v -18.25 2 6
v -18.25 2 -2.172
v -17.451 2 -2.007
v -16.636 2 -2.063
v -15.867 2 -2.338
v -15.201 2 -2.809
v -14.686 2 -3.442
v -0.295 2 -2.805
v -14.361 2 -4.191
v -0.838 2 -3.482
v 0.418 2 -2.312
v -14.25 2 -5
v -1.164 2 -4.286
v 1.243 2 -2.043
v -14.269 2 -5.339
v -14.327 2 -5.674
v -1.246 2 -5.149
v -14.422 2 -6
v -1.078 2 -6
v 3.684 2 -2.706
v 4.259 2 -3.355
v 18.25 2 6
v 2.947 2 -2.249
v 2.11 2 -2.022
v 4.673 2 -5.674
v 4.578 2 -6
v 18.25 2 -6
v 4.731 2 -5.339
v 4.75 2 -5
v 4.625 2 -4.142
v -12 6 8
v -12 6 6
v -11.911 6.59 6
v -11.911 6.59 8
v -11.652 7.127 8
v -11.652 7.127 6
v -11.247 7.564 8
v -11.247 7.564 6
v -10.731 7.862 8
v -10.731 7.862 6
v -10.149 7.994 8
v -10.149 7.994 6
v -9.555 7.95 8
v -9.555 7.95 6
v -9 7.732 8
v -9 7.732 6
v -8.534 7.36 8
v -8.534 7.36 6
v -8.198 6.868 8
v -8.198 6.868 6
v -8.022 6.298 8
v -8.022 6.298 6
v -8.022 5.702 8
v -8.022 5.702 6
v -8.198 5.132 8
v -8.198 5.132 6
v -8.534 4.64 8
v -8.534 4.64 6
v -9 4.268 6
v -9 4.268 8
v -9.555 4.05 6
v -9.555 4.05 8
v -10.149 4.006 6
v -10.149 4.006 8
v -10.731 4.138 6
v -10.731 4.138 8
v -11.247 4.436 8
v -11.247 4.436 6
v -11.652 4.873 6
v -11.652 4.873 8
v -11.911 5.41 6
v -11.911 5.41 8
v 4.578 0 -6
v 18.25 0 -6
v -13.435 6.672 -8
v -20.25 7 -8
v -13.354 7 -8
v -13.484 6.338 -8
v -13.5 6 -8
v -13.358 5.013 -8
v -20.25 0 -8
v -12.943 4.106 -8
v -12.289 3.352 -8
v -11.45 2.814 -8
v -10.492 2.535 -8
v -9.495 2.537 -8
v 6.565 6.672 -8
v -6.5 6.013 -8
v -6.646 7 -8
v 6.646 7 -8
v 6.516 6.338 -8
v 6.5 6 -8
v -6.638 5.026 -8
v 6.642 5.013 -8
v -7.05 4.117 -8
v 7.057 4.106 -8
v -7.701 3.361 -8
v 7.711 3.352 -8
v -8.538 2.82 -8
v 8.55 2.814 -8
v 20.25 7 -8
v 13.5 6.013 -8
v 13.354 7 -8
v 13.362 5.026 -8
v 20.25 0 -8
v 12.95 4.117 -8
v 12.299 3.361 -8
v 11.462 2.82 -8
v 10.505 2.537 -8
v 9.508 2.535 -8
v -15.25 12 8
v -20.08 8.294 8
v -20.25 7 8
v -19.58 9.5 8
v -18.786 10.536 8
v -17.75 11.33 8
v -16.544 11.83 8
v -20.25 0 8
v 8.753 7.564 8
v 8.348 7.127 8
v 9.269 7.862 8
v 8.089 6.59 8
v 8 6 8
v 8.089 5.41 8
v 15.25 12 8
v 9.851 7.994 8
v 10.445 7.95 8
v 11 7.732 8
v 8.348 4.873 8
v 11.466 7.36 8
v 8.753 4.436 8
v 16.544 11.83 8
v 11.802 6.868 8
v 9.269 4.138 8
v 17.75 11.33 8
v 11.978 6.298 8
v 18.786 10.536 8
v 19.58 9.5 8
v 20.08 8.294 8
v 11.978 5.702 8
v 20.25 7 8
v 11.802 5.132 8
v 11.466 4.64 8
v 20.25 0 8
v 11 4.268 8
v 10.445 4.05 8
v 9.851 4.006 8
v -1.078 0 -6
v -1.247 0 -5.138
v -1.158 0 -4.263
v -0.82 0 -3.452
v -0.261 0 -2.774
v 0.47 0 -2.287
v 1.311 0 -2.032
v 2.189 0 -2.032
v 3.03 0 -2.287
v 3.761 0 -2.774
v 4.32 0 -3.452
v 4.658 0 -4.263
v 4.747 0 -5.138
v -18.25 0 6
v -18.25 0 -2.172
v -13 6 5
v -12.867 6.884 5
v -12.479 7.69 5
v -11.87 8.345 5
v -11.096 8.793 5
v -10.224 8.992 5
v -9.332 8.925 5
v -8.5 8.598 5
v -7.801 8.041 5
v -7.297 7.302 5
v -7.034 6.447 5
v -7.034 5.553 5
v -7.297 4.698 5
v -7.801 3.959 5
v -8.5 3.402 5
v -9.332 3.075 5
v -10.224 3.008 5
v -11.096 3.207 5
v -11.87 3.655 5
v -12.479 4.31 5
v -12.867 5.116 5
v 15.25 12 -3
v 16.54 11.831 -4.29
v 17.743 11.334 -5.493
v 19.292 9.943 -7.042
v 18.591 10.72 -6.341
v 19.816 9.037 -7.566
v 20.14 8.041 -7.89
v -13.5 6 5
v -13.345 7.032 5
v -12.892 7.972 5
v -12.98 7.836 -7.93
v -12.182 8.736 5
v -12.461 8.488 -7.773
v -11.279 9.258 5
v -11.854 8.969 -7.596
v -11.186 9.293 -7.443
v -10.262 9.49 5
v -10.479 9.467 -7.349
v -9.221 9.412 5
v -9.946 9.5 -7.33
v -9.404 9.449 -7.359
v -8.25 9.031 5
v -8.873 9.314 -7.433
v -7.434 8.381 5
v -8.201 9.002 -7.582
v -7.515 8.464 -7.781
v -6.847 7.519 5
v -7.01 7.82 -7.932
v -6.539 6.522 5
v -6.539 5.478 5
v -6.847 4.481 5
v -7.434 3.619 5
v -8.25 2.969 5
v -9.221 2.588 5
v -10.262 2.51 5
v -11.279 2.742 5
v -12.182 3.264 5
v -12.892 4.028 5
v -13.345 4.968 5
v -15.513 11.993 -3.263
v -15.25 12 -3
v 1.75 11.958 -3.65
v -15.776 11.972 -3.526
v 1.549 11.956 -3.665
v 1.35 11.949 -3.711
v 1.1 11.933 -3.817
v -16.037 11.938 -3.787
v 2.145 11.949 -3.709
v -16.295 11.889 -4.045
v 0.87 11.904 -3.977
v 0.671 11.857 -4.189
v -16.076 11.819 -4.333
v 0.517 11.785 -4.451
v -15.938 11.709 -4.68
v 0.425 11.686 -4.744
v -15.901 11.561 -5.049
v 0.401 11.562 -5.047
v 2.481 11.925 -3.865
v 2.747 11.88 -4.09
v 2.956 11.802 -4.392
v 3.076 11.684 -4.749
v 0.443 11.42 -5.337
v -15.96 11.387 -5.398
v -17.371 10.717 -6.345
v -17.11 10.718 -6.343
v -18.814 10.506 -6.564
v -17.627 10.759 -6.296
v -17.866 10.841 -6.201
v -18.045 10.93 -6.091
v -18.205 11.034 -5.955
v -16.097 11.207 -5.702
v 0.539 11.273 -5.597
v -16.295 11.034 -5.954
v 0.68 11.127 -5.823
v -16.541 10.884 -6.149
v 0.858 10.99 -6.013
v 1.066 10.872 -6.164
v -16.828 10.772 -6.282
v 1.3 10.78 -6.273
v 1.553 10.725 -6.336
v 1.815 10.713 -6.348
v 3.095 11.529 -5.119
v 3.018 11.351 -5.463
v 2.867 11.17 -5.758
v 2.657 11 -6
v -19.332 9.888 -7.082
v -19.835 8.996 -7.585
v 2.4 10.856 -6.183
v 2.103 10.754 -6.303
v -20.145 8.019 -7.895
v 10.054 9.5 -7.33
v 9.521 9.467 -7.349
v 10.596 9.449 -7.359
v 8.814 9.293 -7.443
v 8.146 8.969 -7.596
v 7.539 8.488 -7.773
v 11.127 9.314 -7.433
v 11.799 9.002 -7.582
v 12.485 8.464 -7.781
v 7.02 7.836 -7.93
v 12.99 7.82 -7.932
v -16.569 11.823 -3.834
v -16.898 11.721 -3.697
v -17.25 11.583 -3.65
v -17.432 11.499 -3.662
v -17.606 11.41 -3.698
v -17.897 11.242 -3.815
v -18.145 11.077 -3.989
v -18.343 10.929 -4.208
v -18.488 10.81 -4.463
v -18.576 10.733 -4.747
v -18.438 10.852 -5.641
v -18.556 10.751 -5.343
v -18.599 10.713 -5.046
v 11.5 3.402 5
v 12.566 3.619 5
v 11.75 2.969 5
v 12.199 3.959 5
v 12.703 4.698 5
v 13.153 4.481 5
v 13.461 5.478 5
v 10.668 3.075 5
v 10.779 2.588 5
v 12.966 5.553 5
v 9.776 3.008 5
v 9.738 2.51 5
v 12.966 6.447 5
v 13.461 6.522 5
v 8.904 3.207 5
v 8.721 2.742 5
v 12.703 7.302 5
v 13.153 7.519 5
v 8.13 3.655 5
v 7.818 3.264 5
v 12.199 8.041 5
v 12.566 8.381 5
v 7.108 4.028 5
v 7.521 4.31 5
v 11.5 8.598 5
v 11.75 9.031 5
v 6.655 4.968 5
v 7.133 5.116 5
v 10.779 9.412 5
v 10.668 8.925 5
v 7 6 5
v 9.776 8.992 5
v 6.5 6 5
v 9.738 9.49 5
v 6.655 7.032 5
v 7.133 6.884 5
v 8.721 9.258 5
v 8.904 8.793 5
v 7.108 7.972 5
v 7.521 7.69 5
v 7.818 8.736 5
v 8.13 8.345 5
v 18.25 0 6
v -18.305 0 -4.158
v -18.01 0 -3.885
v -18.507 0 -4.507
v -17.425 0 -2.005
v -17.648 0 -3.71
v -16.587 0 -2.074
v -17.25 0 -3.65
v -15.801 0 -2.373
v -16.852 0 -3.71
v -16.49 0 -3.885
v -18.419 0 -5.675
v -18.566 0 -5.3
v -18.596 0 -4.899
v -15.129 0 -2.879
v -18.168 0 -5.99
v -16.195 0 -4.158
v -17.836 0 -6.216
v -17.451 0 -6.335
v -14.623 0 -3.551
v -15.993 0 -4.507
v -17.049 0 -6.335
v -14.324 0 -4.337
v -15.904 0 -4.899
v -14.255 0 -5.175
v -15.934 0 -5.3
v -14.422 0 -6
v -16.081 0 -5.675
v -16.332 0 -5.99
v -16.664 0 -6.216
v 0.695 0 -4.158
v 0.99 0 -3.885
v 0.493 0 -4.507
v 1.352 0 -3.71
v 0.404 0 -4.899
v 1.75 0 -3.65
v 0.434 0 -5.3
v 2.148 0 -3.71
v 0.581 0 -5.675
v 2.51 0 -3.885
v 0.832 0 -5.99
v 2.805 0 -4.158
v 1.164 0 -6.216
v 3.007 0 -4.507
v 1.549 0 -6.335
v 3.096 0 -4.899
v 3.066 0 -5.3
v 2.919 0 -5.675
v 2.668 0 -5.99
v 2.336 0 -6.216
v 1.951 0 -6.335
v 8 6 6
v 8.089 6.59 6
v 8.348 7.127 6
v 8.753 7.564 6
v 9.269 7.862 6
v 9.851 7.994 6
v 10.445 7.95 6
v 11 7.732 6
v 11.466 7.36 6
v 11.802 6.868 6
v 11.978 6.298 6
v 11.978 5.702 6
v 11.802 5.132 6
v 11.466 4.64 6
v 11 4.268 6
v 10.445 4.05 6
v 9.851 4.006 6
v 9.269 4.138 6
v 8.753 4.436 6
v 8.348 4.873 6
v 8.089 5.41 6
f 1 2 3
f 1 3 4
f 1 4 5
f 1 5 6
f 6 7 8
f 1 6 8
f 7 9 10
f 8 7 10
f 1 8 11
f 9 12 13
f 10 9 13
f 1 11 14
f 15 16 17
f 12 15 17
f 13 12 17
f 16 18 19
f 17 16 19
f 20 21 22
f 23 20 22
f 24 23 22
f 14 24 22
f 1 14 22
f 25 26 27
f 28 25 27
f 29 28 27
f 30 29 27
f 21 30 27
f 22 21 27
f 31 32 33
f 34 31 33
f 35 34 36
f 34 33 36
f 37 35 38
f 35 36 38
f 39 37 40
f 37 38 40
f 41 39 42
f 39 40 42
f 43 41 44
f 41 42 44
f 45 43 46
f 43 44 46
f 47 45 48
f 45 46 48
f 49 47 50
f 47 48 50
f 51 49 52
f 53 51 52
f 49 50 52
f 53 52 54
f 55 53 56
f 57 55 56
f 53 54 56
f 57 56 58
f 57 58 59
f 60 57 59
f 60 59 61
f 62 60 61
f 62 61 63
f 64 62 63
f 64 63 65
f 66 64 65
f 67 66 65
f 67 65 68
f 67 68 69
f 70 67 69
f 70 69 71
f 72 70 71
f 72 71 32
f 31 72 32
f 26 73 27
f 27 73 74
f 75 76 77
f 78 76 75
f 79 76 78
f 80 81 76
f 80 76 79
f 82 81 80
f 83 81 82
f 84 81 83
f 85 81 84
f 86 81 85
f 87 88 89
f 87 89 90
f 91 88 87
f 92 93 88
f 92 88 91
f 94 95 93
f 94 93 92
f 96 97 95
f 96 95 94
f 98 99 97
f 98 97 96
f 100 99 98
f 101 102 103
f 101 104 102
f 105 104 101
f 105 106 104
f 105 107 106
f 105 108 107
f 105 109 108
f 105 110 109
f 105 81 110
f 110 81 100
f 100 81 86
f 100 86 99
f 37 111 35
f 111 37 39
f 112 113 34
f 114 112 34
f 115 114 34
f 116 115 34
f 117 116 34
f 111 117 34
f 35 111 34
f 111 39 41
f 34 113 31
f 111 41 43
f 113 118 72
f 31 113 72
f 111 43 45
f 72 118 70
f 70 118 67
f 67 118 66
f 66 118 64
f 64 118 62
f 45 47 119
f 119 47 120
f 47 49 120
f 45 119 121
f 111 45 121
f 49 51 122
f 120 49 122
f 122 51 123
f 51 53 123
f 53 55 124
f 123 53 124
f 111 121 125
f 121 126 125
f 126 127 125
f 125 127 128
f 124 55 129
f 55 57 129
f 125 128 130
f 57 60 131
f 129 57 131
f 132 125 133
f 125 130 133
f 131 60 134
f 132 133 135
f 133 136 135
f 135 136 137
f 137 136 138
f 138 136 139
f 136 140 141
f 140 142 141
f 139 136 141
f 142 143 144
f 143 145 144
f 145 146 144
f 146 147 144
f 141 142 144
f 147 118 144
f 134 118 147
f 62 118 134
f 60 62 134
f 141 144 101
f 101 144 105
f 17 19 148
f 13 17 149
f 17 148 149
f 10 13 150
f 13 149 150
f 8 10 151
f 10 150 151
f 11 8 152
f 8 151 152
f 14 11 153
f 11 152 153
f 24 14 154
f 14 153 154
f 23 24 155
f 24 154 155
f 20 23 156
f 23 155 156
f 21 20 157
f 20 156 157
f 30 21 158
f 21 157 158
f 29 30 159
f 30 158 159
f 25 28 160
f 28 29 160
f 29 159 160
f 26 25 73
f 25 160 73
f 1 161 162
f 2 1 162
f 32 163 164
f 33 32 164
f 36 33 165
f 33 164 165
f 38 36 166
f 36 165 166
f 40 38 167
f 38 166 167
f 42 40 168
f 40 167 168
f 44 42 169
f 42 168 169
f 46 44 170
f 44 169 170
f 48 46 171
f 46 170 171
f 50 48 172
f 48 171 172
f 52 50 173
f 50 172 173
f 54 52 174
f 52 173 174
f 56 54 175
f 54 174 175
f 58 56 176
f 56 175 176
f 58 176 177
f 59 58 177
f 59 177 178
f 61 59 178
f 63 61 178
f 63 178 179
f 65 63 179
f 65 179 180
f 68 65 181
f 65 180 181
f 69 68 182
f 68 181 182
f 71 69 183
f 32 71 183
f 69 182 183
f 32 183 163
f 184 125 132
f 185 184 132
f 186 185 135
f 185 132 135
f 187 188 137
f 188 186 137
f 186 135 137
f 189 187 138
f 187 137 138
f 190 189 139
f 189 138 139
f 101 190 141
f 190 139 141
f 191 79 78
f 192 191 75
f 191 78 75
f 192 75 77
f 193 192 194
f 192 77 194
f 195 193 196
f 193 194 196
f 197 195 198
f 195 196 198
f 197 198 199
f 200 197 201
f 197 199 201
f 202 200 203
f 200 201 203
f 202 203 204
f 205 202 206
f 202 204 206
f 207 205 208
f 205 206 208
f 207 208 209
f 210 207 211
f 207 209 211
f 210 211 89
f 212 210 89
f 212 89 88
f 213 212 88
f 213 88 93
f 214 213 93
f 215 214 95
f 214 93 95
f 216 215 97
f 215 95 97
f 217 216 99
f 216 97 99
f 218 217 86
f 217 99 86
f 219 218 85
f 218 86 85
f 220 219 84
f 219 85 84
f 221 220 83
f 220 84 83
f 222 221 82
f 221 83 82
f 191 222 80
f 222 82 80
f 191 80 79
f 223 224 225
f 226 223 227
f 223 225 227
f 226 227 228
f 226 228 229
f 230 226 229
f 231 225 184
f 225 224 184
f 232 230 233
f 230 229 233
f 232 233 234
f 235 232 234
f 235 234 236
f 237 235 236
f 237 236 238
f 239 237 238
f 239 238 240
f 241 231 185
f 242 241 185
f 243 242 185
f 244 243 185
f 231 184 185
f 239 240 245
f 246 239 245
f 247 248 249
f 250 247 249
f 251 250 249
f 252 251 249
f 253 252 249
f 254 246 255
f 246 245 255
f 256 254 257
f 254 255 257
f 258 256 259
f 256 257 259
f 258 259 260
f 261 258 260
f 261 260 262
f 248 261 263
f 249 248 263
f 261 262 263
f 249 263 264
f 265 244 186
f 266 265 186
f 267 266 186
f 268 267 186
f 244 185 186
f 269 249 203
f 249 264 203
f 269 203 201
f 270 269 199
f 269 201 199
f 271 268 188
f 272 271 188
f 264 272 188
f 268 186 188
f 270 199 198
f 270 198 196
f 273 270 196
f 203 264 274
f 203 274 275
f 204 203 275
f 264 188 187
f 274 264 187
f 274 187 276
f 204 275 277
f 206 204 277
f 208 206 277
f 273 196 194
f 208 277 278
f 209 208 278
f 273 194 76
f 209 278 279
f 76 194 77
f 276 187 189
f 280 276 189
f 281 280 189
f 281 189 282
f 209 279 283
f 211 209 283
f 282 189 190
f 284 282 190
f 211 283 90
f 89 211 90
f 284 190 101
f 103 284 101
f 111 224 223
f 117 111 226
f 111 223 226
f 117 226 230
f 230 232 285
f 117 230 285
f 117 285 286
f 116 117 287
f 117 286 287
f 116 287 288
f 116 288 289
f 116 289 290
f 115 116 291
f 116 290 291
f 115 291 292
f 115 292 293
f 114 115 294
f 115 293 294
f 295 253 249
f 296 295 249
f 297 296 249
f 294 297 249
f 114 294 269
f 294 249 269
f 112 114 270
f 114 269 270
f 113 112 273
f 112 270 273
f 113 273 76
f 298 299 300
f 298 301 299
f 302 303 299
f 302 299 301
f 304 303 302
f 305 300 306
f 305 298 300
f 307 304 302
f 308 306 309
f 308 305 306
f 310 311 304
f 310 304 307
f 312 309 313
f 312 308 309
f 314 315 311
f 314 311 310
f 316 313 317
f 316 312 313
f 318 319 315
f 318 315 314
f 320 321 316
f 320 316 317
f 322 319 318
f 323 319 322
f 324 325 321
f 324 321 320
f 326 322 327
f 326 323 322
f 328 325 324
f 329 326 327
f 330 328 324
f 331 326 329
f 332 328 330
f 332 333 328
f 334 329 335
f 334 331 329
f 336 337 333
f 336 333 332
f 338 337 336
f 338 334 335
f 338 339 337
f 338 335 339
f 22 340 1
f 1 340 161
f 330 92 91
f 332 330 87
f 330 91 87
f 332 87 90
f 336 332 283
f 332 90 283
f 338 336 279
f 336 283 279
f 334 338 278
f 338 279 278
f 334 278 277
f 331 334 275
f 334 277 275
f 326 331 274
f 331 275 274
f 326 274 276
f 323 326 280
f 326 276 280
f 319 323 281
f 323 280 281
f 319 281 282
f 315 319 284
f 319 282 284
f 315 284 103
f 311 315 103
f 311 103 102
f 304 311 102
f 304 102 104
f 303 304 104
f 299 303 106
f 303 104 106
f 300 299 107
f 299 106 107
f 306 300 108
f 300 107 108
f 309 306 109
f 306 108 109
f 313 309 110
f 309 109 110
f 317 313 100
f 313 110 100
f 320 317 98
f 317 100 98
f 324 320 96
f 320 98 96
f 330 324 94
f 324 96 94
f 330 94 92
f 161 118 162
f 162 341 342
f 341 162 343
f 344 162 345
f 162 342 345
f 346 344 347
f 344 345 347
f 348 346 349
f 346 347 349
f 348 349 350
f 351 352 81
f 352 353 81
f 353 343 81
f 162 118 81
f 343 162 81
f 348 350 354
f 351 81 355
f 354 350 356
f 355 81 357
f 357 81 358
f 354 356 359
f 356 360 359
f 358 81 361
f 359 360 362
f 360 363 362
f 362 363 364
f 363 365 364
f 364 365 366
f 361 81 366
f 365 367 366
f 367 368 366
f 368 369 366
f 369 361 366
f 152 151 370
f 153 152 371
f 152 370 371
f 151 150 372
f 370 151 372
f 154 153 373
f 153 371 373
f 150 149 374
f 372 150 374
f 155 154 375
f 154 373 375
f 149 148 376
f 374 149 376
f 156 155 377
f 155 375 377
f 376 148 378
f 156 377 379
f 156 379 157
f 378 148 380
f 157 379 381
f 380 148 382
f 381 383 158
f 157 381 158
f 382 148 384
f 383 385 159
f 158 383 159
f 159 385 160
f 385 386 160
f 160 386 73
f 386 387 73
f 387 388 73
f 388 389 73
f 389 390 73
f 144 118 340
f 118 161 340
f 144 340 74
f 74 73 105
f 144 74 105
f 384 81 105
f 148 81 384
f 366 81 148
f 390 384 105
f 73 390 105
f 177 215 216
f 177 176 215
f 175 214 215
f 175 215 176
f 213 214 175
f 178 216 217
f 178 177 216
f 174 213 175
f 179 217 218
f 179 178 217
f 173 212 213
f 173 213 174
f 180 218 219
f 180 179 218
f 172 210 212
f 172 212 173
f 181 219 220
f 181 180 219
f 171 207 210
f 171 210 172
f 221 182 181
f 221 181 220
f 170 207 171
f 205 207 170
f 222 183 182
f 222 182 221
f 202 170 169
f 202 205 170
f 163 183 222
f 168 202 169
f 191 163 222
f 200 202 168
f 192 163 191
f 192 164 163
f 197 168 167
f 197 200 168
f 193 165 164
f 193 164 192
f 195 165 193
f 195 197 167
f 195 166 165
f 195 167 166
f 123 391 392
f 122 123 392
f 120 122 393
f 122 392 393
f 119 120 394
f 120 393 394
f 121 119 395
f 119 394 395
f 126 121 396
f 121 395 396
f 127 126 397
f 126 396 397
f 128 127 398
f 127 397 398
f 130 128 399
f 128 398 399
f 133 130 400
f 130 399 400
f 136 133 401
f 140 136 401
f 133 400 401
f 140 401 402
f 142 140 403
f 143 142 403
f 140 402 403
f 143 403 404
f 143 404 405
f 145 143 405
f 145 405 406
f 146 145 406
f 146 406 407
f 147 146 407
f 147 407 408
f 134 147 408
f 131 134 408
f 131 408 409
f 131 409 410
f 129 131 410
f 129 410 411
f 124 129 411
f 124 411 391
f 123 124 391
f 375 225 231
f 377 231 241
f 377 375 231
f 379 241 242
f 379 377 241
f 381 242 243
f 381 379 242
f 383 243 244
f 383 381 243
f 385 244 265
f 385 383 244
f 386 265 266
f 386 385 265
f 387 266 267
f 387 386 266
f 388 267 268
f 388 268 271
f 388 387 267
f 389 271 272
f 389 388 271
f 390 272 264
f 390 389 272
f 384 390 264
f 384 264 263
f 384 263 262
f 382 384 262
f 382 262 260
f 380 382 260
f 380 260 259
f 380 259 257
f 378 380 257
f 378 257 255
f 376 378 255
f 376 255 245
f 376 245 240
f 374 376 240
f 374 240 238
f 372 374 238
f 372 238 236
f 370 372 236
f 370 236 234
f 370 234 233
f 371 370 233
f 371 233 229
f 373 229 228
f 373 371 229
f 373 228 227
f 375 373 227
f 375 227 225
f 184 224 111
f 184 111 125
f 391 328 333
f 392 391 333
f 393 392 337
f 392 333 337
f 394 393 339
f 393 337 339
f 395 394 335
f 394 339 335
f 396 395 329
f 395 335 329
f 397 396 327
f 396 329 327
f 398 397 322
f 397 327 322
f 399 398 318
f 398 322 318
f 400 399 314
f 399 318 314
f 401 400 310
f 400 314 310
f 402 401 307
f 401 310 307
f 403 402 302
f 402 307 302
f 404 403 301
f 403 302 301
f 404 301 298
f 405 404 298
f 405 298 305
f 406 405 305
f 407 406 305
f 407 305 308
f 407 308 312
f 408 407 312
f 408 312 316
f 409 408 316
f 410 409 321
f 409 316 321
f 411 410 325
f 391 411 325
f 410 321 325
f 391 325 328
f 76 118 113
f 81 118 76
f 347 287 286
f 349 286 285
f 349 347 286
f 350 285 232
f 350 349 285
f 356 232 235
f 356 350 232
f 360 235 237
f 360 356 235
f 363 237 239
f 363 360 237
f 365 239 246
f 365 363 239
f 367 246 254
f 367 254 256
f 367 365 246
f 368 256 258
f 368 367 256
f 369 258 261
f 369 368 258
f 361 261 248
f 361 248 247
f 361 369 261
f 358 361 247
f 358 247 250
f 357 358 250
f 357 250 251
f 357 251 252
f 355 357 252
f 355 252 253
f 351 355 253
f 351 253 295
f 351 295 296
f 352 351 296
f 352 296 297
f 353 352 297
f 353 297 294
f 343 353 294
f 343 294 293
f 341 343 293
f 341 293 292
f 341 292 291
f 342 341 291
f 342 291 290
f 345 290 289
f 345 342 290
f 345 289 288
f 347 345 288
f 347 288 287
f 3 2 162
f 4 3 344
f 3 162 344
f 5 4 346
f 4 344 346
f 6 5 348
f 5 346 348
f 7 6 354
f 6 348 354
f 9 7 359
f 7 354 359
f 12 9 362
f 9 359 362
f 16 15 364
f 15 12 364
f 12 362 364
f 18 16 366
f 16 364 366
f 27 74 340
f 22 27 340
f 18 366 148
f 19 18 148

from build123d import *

# Parameters (mm, degrees)
SKETCH1_W           = 40.5
SKETCH1_H           = 16
SKETCH1_R           = 1.35
BOSS_EXTRUDE1_DEPTH = 12
BOSS_EXTRUDE2_START = 2
BOSS_EXTRUDE2_DEPTH = 10
SKETCH2_R           = 3.5
SKETCH2_R_2         = 2
CUT_EXTRUDE1_DEPTH  = 13
SKETCH2_3_R         = 2
CUT_EXTRUDE2_DEPTH  = 29.461596933
CHAMFER1_SIZE       = 1
FILLET1_R           = 5


with BuildPart() as part:
    # Sketch1 → Boss-Extrude1 (new body)
    with BuildSketch(Plane(origin=(0, 0, 0), x_dir=(1, 0, 0), z_dir=(0, 1, 0))):
        Rectangle(SKETCH1_W, SKETCH1_H)
        with Locations(Location((-17.25, 5, 0), (0, 0, 270))):
            Circle(SKETCH1_R, mode=Mode.SUBTRACT)
        with BuildLine():
            Line((-14.421572875, 6), (-1.078427125, 6))
            ThreePointArc((-1.078427125, 6), (1.75, 2), (4.578427125, 6))
            Line((4.578427125, 6), (18.25, 6))
            Line((18.25, 6), (18.25, -6))
            Line((18.25, -6), (-18.25, -6))
            Line((-18.25, -6), (-18.25, 2.171572875))
            ThreePointArc((-18.25, 2.171572875), (-15.128679656, 2.878679656), (-14.421572875, 6))
        make_face(mode=Mode.SUBTRACT)
        with Locations(Location((1.75, 5, 0), (0, 0, 270))):
            Circle(SKETCH1_R, mode=Mode.SUBTRACT)
    extrude(amount=BOSS_EXTRUDE1_DEPTH)

    # Sketch1<3> → Boss-Extrude2 (add)
    with BuildSketch(Plane(origin=(0, 0, 0), x_dir=(1, 0, 0), z_dir=(0, 1, 0)).offset(BOSS_EXTRUDE2_START)):
        with BuildLine():
            ThreePointArc((-14.25, 5), (-15.517949192, 2.550510257), (-18.25, 2.171572875))
            Line((-18.25, 2.171572875), (-18.25, -6))
            Line((-18.25, -6), (18.25, -6))
            Line((18.25, -6), (18.25, 6))
            Line((18.25, 6), (4.578427125, 6))
            ThreePointArc((4.578427125, 6), (4.706795679, 5.507305936), (4.75, 5))
            ThreePointArc((4.75, 5), (1.242694064, 2.043204321), (-1.078427125, 6))
            Line((-1.078427125, 6), (-14.421572875, 6))
            ThreePointArc((-14.421572875, 6), (-14.293204321, 5.507305936), (-14.25, 5))
        make_face()
    extrude(amount=BOSS_EXTRUDE2_DEPTH)

    # Sketch2 → Cut-Extrude1 (cut)
    # profile 1 of 4: a face of its own
    with BuildSketch(Plane(origin=(0, 0, -8), x_dir=(-1, 0, 0), z_dir=(0, 0, -1))):
        with Locations((-10, 6)):
            Circle(SKETCH2_R)
        with Locations((-10, 6)):
            Circle(SKETCH2_R_2, mode=Mode.SUBTRACT)
    # profile 2 of 4: a face of its own
    with BuildSketch(Plane(origin=(0, 0, -8), x_dir=(-1, 0, 0), z_dir=(0, 0, -1))):
        with Locations((-10, 6)):
            Circle(SKETCH2_R_2)
    # profile 3 of 4: a face of its own
    with BuildSketch(Plane(origin=(0, 0, -8), x_dir=(-1, 0, 0), z_dir=(0, 0, -1))):
        with Locations((10, 6)):
            Circle(SKETCH2_R)
        with Locations((10, 6)):
            Circle(SKETCH2_R_2, mode=Mode.SUBTRACT)
    # profile 4 of 4: a face of its own
    with BuildSketch(Plane(origin=(0, 0, -8), x_dir=(-1, 0, 0), z_dir=(0, 0, -1))):
        with Locations((10, 6)):
            Circle(SKETCH2_R_2)
    extrude(amount=-CUT_EXTRUDE1_DEPTH, mode=Mode.SUBTRACT)

    # Sketch2<3> → Cut-Extrude2 (cut, through all)
    with BuildSketch(Plane(origin=(0, 0, -8), x_dir=(-1, 0, 0), z_dir=(0, 0, -1))):
        with Locations((-10, 6)):
            Circle(SKETCH2_3_R)
        with Locations((10, 6)):
            Circle(SKETCH2_3_R)
    extrude(amount=-CUT_EXTRUDE2_DEPTH, mode=Mode.SUBTRACT)

    # Chamfer1
    chamfer1_edges = [part.edges().sort_by_distance(p)[0] for p in [
        (12, 6, 5),
        (-8, 6, 5),
    ]]
    chamfer(chamfer1_edges, length=CHAMFER1_SIZE)

    # Fillet1
    # the kernel refuses this fillet: 5 mm, written as the material it takes off along each edge
    with BuildSketch(Plane(origin=(32.75, 12, -8), x_dir=(0, -1, 0), z_dir=(-1, 0, 0))) as fillet1_piece_1:
        with BuildLine():
            CenterArc((FILLET1_R, FILLET1_R), FILLET1_R, 180, 90)
            Line((0, FILLET1_R), (0, 0))
            Line((0, 0), (FILLET1_R, 0))
        make_face()
    extrude(amount=65.5, mode=Mode.SUBTRACT)
    with BuildSketch(Plane(origin=(20.25, 12, 20.5), x_dir=(0, -1, 0), z_dir=(0, 0, -1))) as fillet1_piece_2:
        with BuildLine():
            CenterArc((FILLET1_R, FILLET1_R), FILLET1_R, 180, 90)
            Line((0, FILLET1_R), (0, 0))
            Line((0, 0), (FILLET1_R, 0))
        make_face()
    extrude(amount=41, mode=Mode.SUBTRACT)
    with BuildSketch(Plane(origin=(-20.25, 12, -20.5), x_dir=(1, 0, 0), z_dir=(0, 0, 1))) as fillet1_piece_3:
        with BuildLine():
            CenterArc((FILLET1_R, -FILLET1_R), FILLET1_R, 90, 90)
            Line((0, -FILLET1_R), (0, 0))
            Line((0, 0), (FILLET1_R, 0))
        make_face()
    extrude(amount=41, mode=Mode.SUBTRACT)


solid = part.part
